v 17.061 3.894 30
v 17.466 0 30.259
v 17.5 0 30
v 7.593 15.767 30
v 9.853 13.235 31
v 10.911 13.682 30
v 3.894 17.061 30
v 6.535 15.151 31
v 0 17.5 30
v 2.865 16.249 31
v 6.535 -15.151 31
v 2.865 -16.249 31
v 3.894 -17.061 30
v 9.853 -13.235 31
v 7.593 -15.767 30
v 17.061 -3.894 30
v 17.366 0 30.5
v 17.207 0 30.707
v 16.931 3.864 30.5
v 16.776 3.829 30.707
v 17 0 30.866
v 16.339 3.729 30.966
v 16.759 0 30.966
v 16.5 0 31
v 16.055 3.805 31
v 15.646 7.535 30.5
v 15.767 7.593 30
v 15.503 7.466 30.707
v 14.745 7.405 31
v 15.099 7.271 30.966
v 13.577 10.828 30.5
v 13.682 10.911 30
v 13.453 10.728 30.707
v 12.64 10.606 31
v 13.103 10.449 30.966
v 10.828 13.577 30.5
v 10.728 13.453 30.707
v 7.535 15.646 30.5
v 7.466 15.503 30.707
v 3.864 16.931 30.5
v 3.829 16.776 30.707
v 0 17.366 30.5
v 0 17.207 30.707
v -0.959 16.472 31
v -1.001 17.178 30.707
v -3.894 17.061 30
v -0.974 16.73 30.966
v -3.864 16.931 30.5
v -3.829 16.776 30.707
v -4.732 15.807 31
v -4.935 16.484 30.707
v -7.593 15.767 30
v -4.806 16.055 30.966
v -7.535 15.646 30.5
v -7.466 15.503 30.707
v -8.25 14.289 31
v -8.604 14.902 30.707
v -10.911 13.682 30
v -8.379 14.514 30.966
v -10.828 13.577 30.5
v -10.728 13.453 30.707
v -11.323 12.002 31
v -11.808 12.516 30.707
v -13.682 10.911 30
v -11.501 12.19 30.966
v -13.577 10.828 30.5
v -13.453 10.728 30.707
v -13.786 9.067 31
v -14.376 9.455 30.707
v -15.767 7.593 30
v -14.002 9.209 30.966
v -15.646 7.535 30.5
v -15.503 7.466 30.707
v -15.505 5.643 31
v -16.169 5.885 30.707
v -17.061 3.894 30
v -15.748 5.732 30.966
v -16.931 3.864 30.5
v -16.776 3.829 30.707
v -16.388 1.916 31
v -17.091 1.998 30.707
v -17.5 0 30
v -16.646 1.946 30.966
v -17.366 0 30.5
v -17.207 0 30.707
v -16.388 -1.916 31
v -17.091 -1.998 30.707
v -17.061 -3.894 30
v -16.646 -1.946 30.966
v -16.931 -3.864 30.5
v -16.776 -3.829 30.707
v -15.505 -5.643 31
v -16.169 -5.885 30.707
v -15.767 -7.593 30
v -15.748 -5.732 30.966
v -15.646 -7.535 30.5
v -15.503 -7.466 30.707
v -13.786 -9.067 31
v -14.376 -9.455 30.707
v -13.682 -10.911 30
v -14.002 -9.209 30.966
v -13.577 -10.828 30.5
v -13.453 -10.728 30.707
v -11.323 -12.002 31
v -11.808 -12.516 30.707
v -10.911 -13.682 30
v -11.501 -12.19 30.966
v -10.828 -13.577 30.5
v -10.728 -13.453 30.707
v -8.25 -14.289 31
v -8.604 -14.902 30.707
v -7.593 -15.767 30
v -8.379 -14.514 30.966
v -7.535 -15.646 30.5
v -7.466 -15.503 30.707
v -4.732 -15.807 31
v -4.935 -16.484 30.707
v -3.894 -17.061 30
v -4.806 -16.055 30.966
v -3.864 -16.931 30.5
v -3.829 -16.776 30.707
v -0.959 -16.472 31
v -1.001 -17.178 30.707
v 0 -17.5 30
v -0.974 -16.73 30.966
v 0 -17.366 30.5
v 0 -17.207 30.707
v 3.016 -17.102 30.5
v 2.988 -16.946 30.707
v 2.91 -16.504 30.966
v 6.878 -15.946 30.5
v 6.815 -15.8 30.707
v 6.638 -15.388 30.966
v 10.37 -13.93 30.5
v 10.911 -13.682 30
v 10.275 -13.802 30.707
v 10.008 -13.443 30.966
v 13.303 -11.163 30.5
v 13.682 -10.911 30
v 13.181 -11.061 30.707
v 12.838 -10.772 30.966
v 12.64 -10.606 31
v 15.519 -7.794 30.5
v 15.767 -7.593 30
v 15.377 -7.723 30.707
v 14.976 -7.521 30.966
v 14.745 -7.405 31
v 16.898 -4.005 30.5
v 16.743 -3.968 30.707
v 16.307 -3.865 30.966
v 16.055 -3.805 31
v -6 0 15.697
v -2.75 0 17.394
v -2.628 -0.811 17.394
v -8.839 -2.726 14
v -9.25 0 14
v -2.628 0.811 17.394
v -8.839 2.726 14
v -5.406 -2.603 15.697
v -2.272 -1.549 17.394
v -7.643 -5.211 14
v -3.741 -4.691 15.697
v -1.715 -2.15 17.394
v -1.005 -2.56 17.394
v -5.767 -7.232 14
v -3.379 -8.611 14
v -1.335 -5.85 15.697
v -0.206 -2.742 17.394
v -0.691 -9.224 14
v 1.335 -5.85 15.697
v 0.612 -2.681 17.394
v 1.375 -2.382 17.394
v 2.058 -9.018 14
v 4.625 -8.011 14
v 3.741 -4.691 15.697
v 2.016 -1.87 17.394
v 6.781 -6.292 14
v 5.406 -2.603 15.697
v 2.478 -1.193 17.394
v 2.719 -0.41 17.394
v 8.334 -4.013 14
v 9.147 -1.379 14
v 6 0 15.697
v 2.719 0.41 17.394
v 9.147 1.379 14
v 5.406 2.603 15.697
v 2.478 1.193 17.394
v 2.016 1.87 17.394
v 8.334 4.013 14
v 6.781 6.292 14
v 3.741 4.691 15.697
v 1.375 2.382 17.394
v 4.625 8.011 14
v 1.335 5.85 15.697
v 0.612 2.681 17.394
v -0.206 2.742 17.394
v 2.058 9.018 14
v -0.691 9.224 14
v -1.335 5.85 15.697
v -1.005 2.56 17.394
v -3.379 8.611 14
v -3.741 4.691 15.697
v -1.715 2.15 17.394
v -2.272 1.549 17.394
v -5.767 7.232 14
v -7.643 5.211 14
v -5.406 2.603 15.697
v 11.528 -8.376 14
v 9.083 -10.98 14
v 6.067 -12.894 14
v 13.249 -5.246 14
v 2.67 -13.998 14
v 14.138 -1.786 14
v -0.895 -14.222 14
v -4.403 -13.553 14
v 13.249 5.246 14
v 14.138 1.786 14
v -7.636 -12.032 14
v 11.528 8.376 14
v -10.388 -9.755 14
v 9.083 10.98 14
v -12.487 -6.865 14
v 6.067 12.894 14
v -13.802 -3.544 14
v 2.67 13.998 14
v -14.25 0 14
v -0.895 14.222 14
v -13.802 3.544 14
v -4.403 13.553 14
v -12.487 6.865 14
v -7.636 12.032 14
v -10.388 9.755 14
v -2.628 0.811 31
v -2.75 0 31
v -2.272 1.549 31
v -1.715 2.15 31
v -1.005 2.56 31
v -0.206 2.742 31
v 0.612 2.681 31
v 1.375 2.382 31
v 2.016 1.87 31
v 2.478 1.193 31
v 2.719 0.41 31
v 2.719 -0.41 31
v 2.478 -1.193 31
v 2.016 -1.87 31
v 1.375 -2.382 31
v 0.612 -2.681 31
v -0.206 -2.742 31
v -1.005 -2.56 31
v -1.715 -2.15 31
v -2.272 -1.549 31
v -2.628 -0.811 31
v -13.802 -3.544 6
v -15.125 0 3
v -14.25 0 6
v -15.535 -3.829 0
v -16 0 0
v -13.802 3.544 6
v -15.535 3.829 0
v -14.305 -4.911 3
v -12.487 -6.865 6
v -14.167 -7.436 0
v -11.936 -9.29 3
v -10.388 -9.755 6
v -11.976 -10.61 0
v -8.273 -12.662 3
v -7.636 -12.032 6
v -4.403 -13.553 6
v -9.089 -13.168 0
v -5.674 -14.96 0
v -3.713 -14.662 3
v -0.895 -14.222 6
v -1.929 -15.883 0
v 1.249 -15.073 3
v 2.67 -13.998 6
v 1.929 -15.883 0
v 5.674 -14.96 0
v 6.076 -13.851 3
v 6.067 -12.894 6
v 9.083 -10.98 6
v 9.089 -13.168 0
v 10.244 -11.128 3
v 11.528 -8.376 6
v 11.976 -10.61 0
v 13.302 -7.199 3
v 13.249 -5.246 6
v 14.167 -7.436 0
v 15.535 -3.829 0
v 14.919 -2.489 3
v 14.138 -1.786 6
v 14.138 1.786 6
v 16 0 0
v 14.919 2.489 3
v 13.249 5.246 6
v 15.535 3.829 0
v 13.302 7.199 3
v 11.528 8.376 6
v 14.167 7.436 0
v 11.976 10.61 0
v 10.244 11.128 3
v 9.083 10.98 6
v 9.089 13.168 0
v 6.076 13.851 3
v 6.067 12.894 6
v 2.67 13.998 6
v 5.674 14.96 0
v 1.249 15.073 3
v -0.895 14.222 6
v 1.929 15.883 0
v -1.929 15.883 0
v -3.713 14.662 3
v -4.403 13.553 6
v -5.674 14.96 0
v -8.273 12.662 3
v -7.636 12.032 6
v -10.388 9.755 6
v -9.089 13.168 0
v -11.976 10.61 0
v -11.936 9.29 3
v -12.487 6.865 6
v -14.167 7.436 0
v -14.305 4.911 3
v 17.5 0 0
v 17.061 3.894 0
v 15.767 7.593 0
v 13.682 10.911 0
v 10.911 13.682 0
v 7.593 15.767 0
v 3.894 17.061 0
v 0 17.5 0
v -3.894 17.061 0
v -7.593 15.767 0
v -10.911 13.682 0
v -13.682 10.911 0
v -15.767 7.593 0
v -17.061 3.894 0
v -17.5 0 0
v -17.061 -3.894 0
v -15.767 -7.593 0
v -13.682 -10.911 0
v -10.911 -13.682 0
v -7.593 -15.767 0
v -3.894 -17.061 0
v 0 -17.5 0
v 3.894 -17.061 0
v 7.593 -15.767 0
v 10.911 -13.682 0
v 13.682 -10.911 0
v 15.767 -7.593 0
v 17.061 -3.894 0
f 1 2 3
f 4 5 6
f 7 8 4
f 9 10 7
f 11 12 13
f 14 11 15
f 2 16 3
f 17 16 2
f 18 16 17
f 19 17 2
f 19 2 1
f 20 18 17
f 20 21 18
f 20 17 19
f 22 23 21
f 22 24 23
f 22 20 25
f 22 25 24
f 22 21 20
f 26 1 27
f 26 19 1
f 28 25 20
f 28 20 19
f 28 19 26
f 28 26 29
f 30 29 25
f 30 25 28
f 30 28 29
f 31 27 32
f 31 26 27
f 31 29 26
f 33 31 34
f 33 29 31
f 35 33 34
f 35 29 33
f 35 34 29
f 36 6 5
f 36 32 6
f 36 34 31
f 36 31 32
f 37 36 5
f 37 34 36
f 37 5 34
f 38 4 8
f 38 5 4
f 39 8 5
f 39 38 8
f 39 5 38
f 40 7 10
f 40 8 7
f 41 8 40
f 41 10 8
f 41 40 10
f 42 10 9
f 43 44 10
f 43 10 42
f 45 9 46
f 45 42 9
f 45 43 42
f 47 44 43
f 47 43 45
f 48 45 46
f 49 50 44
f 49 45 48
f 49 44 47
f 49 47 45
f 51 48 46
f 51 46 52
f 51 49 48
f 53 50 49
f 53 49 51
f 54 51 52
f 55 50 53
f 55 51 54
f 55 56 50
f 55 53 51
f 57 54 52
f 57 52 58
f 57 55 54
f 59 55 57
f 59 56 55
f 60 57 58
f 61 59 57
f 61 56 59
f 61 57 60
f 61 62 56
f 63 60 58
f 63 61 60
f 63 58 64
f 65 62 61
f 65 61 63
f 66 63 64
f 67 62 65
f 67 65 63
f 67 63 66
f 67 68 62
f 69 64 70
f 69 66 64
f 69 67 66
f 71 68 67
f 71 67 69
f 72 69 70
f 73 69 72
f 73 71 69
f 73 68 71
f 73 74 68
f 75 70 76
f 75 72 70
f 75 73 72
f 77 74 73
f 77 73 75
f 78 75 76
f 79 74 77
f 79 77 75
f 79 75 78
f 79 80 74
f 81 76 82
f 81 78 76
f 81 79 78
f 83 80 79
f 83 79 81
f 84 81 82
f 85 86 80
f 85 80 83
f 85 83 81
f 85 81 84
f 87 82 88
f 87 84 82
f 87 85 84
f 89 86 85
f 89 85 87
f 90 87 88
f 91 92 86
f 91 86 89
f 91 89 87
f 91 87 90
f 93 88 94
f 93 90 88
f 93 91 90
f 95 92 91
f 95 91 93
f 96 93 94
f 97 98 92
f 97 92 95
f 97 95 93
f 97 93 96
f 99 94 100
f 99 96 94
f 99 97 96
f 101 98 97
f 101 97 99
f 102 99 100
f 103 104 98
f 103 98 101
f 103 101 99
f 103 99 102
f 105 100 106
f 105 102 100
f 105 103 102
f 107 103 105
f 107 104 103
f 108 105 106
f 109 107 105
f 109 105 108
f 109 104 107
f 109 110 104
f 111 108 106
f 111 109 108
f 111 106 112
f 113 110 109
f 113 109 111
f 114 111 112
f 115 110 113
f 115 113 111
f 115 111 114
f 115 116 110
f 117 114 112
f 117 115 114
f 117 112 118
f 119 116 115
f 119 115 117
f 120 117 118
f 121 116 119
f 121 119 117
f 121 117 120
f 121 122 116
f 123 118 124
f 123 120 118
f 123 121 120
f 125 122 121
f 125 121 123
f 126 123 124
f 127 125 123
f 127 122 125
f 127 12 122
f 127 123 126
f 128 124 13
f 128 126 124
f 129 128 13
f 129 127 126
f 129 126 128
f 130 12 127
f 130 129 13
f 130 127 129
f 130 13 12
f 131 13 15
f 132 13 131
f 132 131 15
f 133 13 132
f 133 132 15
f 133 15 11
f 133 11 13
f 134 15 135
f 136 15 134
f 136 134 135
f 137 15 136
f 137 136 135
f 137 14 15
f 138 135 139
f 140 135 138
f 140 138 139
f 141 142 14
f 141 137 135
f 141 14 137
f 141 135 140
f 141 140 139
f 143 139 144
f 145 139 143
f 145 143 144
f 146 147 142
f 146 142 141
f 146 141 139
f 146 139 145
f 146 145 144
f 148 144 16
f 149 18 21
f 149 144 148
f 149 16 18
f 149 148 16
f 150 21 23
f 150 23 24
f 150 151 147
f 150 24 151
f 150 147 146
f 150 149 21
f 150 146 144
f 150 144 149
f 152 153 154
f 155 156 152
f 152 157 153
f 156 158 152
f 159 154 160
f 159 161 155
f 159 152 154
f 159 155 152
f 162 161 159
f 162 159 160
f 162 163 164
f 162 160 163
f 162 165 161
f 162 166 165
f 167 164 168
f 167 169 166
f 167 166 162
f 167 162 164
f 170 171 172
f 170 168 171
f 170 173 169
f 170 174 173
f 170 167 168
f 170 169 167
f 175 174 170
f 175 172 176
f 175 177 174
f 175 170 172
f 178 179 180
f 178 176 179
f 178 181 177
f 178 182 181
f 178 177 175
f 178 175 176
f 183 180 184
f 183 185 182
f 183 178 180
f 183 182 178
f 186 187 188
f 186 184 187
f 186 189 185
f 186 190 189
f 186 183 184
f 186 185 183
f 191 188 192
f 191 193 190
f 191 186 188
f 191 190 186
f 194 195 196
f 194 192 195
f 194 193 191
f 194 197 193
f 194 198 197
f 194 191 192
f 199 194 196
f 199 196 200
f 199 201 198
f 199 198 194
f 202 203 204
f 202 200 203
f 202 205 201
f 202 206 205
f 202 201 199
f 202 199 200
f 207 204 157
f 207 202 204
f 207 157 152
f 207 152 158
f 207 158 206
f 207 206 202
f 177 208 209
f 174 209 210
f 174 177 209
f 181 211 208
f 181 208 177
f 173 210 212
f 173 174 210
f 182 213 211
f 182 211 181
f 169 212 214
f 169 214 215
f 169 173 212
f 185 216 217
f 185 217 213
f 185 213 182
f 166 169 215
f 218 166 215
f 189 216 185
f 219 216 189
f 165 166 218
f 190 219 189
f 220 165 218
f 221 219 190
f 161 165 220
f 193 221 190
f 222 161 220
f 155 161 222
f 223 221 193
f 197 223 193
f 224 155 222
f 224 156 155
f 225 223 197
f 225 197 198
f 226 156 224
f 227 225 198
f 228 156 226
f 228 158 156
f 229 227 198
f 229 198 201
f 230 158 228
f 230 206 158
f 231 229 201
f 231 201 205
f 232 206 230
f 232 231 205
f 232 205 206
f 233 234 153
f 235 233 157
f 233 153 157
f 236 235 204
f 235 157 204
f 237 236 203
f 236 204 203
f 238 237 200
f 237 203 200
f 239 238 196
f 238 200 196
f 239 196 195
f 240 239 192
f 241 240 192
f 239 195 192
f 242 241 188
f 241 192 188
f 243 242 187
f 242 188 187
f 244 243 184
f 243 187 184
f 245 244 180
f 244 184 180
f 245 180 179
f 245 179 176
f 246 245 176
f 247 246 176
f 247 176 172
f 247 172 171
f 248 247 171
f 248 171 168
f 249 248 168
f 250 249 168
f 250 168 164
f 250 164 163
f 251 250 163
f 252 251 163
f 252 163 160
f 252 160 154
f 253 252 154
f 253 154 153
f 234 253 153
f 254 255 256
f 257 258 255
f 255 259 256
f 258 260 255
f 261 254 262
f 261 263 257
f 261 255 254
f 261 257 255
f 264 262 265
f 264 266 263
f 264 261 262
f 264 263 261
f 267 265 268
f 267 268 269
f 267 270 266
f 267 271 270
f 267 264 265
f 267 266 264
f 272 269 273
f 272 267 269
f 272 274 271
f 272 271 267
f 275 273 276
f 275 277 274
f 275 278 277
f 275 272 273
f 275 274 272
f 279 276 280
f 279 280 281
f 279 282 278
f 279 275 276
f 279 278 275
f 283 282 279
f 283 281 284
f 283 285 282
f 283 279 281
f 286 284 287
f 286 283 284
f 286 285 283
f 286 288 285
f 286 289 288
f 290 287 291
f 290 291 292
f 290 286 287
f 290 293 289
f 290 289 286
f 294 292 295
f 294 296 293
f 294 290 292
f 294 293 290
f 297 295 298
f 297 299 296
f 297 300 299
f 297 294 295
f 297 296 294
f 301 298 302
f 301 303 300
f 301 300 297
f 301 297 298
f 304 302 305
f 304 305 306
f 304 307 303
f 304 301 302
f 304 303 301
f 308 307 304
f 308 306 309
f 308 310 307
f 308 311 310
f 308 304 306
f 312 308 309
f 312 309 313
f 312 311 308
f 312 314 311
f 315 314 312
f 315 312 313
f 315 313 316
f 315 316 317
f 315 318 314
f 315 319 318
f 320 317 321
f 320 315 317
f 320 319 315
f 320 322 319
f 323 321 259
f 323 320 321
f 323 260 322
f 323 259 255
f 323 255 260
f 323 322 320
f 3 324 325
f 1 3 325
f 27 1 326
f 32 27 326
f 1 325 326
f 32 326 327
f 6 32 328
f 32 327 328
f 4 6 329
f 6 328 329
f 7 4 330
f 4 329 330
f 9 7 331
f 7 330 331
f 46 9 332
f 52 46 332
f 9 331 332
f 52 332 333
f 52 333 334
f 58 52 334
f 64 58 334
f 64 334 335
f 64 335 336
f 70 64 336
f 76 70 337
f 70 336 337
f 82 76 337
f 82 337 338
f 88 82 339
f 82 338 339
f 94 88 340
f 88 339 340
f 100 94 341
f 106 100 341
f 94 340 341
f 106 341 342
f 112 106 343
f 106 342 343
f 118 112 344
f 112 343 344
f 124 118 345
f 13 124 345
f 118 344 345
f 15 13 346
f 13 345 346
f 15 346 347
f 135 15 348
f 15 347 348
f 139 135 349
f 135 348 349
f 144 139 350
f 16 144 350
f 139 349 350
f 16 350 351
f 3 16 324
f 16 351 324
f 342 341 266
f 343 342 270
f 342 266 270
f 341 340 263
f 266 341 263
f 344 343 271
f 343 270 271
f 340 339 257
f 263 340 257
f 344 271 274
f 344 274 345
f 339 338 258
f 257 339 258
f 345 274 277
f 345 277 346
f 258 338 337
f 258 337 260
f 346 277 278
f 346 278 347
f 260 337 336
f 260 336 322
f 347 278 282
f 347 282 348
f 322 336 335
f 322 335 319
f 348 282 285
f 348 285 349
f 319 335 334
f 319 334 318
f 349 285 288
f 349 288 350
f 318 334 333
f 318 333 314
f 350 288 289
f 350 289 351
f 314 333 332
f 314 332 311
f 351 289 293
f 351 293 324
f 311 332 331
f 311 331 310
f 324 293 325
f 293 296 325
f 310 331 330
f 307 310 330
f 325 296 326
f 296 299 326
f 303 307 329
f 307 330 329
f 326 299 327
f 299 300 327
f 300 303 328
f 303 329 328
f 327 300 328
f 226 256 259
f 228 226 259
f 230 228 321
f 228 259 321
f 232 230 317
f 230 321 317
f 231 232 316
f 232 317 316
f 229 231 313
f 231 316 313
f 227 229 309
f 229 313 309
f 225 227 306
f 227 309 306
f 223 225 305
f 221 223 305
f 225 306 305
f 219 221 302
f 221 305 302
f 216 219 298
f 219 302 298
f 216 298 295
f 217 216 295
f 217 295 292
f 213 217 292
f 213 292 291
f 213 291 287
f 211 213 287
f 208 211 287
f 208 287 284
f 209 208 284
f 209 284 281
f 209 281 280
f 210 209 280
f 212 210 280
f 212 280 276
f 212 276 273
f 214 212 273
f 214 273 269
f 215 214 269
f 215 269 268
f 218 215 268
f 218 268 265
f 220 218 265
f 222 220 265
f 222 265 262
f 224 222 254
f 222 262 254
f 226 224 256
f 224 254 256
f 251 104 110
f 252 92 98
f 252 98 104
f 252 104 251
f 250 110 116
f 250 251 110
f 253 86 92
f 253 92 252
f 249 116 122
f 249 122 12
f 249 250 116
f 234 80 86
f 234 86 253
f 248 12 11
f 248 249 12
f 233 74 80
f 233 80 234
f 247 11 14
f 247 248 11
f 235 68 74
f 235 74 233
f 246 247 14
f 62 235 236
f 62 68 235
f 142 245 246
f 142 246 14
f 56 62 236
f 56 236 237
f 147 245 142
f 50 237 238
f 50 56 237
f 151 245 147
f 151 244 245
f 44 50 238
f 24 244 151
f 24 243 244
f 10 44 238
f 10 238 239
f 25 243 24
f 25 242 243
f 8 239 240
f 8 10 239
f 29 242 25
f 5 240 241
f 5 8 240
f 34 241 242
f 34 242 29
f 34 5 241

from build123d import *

# Parameters (mm, degrees)
SCHIZZO1_R                   = 17.5
ESTRUSIONE_ESTRUSIONE1_DEPTH = 31
RACCORDO1_R                  = 1
SCHIZZO2_R                   = 14.25
TAGLIO_ESTRUSIONE1_DEPTH     = 14
TAGLIO_ESTRUSIONE2_START     = -4.7
SCHIZZO5_R                   = 0.25
TAGLIO_ESTRUSIONE2_DEPTH     = 4.7
FORO_PER_VITE_M5_1_D         = 5.5


with BuildPart() as part:
    # Schizzo1 → Estrusione-Estrusione1 (new body)
    with BuildSketch(Plane.XY):
        Circle(SCHIZZO1_R)
    extrude(amount=ESTRUSIONE_ESTRUSIONE1_DEPTH)

    # Raccordo1
    raccordo1_edges = [part.edges().sort_by_distance(p)[0] for p in [
        (-17.5, 0, 31),
    ]]
    fillet(raccordo1_edges, radius=RACCORDO1_R)

    # Schizzo2 → Taglio-Estrusione1 (cut)
    with BuildSketch(Plane(origin=(0, 0, 0), x_dir=(-1, 0, 0), z_dir=(0, 0, -1))):
        Circle(SCHIZZO2_R)
    extrude(amount=-TAGLIO_ESTRUSIONE1_DEPTH, mode=Mode.SUBTRACT)

    # Schizzo3 → Taglia-Rivoluzione1 (revolve, cut)
    with BuildSketch(Plane(origin=(0, 0, 0), x_dir=(1, 0, 0), z_dir=(0, 1, 0)), mode=Mode.PRIVATE) as taglia_rivoluzione1_sk:
        Polygon((16, 0), (14.25, 0), (14.25, -6), align=None)
    revolve(taglia_rivoluzione1_sk.sketch.rotate(Axis((0, 0, 0), (0, 0, 1)), 180), axis=Axis((0, 0, 0), (0, 0, 1)), mode=Mode.SUBTRACT)

    # Schizzo4 → Taglia-Rivoluzione2 (revolve, cut)
    with BuildSketch(Plane(origin=(0, 0, 0), x_dir=(1, 0, 0), z_dir=(0, 1, 0)), mode=Mode.PRIVATE) as taglia_rivoluzione2_sk:
        Polygon((0.25, -18.7), (9.25, -14), (0.25, -14), align=None)
    revolve(taglia_rivoluzione2_sk.sketch.rotate(Axis((0, 0, 14), (0, 0, 1)), 180), axis=Axis((0, 0, 14), (0, 0, 1)), mode=Mode.SUBTRACT)

    # Schizzo5 → Taglio-Estrusione2 (cut)
    with BuildSketch(Plane(origin=(0, 0, 14), x_dir=(-1, 0, 0), z_dir=(0, 0, -1)).offset(TAGLIO_ESTRUSIONE2_START)):
        Circle(SCHIZZO5_R)
    extrude(amount=TAGLIO_ESTRUSIONE2_DEPTH, mode=Mode.SUBTRACT)

    # Foro per Vite M5-1 (through all)
    with Locations(Plane.XY.offset(31)):
        with Locations((0, 0)):
            Hole(FORO_PER_VITE_M5_1_D / 2)


solid = part.part
